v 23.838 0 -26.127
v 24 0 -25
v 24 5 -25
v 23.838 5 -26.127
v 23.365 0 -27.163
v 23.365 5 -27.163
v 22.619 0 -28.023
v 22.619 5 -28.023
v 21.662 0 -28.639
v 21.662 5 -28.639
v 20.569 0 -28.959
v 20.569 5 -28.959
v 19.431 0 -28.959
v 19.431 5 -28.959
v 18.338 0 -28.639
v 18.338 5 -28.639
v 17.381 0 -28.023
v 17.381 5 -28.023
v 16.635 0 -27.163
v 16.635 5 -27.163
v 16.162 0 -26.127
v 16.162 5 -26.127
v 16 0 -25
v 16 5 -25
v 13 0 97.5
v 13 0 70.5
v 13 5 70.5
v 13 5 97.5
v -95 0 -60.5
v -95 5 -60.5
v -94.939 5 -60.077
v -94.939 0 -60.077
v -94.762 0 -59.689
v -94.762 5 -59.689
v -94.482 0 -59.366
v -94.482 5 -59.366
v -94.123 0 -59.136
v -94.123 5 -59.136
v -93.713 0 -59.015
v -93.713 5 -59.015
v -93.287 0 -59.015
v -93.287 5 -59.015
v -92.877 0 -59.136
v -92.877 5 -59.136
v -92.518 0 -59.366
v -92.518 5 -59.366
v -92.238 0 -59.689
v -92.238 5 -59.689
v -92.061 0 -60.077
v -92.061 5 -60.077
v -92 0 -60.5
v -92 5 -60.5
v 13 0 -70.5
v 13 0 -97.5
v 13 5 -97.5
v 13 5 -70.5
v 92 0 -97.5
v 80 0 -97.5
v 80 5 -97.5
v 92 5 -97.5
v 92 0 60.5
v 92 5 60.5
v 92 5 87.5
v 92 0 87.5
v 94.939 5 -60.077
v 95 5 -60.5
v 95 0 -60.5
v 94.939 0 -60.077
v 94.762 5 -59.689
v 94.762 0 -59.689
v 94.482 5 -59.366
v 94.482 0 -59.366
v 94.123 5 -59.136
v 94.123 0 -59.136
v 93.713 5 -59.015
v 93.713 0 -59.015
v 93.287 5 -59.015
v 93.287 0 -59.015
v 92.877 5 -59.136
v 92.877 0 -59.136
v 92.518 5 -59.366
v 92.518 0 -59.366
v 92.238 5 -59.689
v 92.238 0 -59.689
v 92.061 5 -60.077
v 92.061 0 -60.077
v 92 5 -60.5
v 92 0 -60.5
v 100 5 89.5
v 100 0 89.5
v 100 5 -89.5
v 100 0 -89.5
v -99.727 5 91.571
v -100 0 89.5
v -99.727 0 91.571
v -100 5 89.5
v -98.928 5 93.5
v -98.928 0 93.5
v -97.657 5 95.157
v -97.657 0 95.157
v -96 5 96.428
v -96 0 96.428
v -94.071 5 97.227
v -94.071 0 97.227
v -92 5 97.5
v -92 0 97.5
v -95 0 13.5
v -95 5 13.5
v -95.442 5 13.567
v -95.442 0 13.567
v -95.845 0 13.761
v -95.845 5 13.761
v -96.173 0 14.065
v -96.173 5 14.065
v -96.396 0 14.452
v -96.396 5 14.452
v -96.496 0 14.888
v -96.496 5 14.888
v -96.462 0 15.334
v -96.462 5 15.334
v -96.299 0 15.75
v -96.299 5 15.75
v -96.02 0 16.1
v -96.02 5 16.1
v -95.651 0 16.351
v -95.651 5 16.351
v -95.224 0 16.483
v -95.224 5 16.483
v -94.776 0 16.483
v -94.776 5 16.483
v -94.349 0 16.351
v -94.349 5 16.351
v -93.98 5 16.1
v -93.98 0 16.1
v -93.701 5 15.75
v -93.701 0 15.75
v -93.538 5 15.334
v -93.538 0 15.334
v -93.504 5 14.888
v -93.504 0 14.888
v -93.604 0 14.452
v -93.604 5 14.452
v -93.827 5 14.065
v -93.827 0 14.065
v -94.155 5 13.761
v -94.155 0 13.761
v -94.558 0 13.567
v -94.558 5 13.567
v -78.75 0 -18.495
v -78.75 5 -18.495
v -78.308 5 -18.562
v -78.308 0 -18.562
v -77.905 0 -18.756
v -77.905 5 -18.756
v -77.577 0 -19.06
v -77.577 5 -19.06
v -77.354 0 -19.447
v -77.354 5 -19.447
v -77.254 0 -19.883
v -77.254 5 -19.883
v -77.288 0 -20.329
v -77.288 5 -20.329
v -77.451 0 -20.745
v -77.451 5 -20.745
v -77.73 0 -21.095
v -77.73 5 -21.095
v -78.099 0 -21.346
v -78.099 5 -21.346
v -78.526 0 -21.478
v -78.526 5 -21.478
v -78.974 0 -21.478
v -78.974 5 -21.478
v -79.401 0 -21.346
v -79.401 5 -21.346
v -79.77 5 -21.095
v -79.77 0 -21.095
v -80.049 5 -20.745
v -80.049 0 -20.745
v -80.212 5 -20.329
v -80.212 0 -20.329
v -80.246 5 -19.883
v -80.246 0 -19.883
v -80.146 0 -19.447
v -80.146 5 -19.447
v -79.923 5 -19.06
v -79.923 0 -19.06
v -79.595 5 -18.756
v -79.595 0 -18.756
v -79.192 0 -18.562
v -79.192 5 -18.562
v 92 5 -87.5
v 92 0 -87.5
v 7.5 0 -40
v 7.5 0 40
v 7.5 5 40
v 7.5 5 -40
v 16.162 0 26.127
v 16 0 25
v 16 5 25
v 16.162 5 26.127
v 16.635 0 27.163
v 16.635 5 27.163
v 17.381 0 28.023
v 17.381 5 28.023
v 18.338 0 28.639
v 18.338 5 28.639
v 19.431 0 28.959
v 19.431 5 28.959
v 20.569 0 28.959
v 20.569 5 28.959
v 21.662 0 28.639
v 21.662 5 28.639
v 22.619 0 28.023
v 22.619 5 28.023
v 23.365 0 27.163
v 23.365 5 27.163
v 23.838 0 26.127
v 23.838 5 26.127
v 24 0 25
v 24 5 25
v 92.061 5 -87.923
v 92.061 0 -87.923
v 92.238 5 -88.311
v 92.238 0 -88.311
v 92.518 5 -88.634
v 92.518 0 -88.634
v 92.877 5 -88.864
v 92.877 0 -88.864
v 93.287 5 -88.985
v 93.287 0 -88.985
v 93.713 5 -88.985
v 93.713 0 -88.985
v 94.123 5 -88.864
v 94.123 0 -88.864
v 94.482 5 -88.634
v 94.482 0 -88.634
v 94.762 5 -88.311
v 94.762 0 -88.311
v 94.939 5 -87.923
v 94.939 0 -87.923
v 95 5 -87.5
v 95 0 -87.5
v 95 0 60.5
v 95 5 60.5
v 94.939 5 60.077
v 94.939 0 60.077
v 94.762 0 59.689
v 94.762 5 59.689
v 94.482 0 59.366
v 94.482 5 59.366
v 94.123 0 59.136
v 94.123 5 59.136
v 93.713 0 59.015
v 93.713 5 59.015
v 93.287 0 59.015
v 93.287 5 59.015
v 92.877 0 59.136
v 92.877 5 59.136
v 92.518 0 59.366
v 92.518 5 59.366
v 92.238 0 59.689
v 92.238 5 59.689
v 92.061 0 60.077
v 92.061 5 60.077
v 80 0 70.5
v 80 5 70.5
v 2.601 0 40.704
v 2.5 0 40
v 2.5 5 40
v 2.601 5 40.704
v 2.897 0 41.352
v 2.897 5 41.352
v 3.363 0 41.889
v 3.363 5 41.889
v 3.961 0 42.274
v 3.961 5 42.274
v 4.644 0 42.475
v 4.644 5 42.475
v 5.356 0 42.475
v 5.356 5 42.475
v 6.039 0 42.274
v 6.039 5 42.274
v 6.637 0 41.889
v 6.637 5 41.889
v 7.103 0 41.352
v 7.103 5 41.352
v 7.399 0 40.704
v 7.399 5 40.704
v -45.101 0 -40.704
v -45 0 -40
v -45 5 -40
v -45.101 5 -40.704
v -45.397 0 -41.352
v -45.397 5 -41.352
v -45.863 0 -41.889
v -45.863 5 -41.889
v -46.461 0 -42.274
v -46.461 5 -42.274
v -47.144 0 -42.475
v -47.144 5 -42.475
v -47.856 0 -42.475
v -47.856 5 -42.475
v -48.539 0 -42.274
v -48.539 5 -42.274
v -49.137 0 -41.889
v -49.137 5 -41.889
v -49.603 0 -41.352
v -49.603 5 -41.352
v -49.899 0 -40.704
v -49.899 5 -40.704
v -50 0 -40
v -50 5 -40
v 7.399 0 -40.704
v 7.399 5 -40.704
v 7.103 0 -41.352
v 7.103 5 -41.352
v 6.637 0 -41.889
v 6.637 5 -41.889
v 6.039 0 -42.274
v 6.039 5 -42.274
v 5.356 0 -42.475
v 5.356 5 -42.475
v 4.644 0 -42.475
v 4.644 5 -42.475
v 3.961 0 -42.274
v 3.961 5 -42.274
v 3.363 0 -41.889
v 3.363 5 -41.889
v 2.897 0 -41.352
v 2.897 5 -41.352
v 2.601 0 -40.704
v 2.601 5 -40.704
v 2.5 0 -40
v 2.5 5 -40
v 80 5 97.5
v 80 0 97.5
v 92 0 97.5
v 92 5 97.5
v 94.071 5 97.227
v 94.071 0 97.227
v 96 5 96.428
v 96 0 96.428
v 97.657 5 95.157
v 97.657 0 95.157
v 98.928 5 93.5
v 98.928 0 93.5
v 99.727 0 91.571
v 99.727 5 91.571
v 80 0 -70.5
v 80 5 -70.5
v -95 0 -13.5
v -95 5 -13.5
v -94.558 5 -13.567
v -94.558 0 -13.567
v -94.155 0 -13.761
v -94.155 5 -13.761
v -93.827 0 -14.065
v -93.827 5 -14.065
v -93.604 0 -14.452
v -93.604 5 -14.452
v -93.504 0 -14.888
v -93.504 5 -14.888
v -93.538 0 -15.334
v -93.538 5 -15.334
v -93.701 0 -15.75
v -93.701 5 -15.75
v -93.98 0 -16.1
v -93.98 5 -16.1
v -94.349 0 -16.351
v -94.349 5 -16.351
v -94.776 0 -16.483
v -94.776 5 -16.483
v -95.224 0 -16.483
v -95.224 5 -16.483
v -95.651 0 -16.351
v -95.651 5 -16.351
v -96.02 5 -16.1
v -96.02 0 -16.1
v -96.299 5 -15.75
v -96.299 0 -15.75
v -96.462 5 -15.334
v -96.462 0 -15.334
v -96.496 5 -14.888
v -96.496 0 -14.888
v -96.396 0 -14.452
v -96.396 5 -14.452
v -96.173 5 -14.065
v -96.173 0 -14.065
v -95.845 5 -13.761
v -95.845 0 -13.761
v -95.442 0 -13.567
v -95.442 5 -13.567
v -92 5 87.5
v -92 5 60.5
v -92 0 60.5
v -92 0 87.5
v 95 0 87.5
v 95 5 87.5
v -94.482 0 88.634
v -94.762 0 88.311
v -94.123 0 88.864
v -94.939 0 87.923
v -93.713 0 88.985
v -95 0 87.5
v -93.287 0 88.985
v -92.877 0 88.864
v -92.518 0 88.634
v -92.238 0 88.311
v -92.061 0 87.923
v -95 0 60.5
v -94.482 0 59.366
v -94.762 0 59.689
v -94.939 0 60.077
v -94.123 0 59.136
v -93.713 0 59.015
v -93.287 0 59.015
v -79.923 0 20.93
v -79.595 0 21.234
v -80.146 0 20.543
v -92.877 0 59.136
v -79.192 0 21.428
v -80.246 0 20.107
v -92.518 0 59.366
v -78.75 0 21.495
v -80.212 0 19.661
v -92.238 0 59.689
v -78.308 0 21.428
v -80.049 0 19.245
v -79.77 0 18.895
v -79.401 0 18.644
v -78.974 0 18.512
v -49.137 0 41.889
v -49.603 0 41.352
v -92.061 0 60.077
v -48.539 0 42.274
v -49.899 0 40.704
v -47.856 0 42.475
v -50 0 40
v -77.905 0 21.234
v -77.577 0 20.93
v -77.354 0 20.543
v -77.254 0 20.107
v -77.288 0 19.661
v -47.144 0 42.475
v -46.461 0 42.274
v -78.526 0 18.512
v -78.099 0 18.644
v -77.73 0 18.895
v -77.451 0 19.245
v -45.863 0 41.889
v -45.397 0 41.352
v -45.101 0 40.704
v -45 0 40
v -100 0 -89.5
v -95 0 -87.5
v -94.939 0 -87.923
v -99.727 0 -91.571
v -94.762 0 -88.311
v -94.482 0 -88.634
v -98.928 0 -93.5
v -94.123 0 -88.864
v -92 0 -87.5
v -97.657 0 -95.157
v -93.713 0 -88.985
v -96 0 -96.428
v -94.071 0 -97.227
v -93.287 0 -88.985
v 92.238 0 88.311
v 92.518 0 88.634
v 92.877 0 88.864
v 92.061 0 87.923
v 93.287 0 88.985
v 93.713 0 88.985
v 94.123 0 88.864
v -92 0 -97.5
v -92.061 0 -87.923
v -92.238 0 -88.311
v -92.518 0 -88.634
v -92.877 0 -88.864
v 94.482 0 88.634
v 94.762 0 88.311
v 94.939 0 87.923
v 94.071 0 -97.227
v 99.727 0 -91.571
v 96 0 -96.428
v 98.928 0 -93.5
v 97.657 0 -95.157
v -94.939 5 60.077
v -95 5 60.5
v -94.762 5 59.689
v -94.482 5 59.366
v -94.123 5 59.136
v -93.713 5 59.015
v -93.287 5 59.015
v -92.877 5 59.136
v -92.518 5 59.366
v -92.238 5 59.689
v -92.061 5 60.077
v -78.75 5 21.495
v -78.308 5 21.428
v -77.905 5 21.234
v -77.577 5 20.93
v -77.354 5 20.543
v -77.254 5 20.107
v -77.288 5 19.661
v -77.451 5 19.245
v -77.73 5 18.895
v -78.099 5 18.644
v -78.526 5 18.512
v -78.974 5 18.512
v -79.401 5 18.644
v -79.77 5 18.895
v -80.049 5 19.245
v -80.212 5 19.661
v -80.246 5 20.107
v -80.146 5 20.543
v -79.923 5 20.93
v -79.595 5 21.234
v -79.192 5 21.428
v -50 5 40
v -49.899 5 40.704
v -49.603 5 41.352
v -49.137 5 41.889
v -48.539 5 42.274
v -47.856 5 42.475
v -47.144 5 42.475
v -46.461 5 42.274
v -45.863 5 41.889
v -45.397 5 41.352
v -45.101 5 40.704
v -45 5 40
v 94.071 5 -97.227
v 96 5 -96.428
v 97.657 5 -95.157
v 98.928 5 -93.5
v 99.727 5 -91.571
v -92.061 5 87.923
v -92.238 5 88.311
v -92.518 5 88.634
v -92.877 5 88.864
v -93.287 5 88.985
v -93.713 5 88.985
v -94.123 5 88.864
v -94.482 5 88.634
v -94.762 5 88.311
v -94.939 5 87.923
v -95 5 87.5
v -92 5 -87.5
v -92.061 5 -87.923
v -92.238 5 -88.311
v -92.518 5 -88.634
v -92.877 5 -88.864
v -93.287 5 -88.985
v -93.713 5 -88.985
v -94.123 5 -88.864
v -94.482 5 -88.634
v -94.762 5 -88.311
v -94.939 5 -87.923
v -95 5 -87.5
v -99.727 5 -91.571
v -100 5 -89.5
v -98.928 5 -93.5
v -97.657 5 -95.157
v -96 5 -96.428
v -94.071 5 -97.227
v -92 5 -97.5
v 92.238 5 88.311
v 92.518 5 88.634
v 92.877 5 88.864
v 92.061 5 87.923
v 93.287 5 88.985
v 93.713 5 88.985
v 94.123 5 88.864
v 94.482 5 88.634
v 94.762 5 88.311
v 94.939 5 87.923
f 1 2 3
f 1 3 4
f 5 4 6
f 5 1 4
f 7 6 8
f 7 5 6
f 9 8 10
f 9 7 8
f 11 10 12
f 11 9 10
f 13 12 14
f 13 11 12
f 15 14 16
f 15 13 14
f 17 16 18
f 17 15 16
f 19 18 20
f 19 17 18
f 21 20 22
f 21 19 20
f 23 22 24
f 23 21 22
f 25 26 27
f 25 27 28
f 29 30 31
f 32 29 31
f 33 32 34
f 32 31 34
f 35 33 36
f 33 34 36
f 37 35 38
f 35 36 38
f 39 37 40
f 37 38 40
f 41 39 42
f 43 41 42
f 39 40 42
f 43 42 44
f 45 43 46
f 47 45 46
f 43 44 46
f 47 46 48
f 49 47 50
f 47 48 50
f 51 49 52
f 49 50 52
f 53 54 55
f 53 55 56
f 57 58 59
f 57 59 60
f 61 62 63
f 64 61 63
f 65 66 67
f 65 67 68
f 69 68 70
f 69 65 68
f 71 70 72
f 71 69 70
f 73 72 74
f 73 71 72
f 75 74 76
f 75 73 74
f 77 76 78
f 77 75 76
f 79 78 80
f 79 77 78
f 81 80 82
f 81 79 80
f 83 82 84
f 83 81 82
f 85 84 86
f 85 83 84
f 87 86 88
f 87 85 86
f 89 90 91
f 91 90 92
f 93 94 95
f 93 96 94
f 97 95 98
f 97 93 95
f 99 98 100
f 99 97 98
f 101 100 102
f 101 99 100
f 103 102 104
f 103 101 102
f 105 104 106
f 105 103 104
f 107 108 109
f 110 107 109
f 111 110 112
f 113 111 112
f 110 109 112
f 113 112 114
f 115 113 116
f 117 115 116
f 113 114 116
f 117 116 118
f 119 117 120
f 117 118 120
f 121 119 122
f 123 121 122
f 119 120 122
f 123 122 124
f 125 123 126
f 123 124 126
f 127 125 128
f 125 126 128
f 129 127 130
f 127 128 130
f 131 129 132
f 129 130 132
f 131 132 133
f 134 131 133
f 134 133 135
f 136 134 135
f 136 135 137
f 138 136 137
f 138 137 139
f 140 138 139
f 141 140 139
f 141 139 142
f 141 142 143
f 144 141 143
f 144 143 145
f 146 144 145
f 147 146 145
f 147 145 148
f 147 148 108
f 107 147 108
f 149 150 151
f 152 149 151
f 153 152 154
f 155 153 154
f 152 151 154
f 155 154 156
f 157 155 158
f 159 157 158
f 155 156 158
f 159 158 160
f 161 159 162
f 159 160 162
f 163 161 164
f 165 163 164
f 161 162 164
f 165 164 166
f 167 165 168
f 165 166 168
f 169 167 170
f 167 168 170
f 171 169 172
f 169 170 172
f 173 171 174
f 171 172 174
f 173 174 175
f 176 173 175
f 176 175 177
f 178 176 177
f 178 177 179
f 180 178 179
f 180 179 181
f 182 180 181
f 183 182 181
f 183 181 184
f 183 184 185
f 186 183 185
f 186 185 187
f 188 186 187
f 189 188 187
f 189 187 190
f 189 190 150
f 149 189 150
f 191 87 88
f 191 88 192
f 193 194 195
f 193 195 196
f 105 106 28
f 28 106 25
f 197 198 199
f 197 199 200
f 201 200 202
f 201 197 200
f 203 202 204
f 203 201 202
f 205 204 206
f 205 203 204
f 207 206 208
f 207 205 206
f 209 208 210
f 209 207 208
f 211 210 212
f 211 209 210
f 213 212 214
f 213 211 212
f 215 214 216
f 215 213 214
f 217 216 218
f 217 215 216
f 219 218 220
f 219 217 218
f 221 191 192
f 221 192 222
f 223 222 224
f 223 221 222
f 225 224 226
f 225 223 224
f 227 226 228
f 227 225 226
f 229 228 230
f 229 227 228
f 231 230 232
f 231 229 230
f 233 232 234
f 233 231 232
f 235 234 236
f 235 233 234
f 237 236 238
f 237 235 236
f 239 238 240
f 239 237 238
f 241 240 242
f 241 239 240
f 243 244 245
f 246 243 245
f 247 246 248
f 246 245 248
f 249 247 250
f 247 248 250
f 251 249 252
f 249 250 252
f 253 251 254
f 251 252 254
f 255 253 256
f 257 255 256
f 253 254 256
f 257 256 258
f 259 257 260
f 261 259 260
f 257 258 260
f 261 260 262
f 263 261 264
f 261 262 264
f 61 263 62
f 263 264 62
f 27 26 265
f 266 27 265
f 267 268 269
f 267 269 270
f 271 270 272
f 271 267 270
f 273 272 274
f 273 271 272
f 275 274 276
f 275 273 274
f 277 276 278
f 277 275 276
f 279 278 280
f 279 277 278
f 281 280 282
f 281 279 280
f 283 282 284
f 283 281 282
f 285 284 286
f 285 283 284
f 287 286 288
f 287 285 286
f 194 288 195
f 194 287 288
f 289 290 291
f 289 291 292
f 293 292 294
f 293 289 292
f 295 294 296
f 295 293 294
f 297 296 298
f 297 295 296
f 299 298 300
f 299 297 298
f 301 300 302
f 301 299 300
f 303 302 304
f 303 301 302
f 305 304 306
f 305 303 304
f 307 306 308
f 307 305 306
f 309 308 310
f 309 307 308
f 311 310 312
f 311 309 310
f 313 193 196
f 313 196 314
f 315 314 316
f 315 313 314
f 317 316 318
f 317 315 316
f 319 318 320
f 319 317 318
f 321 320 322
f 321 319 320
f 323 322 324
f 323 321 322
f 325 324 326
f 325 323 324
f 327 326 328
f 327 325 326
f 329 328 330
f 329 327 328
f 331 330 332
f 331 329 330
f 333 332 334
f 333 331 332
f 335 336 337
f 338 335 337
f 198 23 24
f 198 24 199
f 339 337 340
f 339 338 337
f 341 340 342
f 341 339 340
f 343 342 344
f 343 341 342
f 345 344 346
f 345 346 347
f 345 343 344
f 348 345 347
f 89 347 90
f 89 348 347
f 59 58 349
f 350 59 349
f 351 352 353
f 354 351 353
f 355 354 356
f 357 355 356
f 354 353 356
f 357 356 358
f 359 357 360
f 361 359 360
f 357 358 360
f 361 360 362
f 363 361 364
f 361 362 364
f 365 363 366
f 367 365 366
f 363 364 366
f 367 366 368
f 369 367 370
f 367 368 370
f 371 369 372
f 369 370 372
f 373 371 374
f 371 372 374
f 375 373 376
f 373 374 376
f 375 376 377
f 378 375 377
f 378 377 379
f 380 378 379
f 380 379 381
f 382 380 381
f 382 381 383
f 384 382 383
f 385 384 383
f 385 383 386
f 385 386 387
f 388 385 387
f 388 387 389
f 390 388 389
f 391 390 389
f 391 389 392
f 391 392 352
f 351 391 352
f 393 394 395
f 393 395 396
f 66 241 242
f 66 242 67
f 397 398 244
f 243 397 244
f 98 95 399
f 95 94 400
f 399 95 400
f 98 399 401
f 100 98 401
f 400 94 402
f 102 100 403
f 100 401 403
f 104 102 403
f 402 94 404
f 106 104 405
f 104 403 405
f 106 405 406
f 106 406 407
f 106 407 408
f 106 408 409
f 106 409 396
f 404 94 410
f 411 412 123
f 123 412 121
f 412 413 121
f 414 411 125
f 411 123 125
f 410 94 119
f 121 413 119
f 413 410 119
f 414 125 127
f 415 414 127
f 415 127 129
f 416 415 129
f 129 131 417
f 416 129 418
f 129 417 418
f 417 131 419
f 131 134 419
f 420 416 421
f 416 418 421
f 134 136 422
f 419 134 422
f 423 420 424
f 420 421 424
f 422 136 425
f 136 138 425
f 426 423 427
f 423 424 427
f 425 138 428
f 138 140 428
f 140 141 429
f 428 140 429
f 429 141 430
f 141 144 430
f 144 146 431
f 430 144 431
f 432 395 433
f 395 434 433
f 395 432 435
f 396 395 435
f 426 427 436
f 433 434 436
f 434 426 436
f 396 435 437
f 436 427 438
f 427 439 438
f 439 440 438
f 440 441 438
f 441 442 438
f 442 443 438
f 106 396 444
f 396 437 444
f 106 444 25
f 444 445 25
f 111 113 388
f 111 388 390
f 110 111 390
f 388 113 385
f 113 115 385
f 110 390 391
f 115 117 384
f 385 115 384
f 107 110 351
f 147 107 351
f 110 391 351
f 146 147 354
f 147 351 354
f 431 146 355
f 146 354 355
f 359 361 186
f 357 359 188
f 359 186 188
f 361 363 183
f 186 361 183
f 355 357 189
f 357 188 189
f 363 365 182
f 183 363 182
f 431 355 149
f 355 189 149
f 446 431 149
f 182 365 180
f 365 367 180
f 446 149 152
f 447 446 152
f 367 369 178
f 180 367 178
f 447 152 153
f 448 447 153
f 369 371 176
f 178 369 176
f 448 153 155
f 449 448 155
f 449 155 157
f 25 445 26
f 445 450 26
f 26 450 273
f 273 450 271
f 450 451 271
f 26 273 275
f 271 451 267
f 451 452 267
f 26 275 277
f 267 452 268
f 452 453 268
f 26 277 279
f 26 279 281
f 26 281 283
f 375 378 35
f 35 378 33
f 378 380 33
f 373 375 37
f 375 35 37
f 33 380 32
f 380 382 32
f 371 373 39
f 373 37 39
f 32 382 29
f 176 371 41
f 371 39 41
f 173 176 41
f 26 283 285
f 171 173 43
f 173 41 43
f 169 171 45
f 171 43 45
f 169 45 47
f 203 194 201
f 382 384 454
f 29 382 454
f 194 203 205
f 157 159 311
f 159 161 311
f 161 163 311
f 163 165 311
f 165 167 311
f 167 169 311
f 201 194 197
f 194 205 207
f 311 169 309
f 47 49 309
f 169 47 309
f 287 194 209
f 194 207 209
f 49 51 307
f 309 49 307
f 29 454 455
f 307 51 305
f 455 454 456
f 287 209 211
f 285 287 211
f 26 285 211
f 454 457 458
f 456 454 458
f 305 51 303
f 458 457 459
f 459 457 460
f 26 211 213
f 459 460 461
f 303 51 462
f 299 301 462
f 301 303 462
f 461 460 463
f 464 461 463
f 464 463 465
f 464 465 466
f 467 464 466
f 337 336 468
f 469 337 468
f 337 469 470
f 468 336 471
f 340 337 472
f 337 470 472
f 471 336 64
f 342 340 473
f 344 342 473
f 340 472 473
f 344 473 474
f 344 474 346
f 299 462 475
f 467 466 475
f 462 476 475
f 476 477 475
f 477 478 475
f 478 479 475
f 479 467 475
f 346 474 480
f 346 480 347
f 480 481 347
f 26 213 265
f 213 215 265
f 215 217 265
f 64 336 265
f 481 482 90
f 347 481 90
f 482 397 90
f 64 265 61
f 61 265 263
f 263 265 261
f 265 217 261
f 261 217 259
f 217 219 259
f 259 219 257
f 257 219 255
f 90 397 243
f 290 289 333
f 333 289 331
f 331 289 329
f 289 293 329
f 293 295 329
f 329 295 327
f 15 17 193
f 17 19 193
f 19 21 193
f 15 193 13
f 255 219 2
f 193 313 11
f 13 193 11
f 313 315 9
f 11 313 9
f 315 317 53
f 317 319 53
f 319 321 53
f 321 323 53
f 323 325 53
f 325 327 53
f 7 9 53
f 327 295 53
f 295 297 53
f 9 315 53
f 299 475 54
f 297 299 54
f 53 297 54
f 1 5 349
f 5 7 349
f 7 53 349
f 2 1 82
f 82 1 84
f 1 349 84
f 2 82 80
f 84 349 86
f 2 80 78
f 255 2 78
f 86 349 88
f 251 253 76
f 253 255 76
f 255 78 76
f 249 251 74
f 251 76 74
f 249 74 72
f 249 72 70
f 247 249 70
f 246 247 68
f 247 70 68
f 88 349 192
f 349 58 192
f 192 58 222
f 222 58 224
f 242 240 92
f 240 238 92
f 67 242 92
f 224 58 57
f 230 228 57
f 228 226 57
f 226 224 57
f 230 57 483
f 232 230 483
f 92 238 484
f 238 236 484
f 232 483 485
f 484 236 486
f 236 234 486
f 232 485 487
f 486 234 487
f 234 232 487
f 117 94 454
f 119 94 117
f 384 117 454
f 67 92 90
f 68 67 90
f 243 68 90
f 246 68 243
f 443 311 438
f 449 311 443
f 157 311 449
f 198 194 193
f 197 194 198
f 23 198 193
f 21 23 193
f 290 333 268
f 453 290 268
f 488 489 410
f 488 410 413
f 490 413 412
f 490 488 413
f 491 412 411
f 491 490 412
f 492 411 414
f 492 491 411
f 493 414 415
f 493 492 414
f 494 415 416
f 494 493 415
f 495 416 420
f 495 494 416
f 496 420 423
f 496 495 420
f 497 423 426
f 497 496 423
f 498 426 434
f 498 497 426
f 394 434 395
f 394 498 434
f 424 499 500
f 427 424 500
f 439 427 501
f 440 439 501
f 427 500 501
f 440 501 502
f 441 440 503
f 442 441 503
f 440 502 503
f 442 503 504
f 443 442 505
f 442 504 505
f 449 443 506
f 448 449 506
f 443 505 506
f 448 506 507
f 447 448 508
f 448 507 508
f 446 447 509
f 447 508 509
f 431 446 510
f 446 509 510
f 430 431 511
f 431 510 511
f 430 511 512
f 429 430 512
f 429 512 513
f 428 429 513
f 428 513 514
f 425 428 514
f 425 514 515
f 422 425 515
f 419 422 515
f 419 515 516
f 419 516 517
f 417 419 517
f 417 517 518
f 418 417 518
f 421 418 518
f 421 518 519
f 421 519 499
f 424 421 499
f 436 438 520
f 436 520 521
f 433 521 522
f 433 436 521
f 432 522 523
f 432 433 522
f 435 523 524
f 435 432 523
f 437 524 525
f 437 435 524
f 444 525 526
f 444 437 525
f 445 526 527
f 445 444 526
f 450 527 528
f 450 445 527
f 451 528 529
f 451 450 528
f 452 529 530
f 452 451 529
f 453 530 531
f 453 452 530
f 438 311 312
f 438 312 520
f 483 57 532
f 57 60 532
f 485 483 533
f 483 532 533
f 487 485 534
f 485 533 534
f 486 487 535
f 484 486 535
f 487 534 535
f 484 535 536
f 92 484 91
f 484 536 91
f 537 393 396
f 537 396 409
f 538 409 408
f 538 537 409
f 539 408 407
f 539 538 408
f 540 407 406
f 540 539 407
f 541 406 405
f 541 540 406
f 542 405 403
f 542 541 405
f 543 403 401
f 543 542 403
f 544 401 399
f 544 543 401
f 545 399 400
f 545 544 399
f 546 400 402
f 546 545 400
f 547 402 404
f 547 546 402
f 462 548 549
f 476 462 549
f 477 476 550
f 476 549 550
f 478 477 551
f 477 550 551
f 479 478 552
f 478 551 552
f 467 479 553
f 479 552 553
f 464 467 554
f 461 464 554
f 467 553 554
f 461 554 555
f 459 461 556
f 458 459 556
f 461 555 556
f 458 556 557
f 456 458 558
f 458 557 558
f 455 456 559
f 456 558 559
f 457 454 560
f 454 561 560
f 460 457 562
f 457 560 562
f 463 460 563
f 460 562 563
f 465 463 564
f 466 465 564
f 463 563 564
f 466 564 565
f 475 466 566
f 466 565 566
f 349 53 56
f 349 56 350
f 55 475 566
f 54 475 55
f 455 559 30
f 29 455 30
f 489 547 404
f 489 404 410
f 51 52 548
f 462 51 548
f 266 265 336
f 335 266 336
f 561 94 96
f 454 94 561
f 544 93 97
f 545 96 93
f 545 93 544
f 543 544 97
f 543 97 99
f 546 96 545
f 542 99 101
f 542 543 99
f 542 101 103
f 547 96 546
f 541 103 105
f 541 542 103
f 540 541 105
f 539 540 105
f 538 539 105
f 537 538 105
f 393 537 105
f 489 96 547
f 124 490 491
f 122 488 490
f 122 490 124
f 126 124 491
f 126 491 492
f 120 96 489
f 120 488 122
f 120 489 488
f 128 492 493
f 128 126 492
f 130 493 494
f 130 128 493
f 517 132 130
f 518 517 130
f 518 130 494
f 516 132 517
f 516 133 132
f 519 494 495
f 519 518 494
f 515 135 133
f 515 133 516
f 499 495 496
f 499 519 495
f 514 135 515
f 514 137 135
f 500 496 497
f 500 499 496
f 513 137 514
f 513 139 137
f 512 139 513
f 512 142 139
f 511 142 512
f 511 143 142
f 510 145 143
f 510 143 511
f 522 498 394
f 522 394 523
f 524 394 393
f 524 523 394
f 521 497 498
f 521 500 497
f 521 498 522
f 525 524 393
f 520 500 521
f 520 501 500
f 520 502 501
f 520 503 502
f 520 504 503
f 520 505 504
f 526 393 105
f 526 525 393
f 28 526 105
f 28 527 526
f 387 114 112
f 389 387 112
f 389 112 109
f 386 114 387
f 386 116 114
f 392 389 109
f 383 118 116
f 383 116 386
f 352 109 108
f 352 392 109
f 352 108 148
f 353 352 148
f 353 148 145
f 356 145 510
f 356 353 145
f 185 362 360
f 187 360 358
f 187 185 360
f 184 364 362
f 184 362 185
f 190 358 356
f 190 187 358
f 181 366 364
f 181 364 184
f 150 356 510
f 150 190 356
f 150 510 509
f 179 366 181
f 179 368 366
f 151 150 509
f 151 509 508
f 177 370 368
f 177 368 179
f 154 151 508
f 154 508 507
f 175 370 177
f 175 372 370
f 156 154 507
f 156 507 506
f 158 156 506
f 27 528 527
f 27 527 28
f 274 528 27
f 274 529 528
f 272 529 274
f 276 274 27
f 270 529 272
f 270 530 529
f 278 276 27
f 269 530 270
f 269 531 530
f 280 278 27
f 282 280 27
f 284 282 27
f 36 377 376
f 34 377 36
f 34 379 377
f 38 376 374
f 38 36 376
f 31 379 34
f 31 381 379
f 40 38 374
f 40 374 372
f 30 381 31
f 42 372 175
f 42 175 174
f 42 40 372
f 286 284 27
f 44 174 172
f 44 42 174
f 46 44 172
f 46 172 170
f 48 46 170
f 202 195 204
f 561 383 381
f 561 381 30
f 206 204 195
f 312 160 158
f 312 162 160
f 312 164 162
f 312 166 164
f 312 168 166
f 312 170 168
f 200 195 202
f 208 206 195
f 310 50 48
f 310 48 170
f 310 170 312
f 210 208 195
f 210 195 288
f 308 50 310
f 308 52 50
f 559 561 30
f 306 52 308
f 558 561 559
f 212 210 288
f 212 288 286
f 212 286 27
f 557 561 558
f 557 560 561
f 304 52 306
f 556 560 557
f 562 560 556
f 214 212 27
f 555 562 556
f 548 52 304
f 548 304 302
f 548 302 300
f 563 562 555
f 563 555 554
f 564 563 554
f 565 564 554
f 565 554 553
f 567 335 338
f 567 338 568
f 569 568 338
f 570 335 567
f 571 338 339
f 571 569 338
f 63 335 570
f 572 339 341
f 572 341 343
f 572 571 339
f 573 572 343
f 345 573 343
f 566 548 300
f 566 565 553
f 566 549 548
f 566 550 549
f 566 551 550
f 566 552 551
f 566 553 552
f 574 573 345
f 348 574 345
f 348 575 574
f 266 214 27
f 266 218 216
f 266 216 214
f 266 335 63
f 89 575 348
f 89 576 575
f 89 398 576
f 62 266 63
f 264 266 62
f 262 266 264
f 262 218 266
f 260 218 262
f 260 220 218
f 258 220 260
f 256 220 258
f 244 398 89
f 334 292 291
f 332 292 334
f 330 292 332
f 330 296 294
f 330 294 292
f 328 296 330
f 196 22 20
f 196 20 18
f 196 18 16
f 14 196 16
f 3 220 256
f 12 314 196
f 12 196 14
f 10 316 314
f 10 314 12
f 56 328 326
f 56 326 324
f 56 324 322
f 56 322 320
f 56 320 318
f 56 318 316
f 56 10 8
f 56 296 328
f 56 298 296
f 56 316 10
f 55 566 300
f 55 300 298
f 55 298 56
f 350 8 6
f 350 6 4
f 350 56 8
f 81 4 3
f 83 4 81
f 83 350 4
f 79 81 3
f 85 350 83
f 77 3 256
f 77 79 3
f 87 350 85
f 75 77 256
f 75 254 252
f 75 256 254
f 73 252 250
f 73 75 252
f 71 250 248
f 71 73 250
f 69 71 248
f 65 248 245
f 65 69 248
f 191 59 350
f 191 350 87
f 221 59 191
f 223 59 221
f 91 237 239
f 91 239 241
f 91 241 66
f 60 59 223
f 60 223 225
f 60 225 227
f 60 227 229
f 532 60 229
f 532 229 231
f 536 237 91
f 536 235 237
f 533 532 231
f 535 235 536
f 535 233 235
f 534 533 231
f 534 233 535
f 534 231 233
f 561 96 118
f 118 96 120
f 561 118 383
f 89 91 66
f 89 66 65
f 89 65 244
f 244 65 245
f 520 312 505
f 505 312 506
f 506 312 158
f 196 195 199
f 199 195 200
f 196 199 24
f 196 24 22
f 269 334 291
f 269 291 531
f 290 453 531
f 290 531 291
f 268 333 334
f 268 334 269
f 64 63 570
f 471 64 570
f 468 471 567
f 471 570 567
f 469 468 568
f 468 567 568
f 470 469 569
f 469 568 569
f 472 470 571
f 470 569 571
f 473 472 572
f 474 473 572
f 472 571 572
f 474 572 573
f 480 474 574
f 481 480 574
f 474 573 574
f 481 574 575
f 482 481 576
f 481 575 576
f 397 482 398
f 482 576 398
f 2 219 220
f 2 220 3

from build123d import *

# Parameters (mm, degrees)
SKETCH2_W           = 200
SKETCH2_H           = 195
BOSS_EXTRUDE1_DEPTH = 5
CUT_EXTRUDE1_DEPTH  = 140.754248594
SKETCH4_W           = 67
SKETCH4_H           = 27
CUT_EXTRUDE2_DEPTH  = 140.754248594
SKETCH8_R           = 1.5
CUT_EXTRUDE6_DEPTH  = 140.754248594
SKETCH9_R           = 1.5
CUT_EXTRUDE7_DEPTH  = 140.754248594
FILLET1_R           = 8


with BuildPart() as part:
    # Sketch2 → Boss-Extrude1 (new body)
    with BuildSketch(Plane(origin=(0, 0, 0), x_dir=(1, 0, 0), z_dir=(0, 1, 0))):
        Rectangle(SKETCH2_W, SKETCH2_H)
    extrude(amount=BOSS_EXTRUDE1_DEPTH)

    # Sketch3 → Cut-Extrude1 (cut, through all)
    with BuildSketch(Plane(origin=(0, 5, 0), x_dir=(1, 0, 0), z_dir=(0, 1, 0))):
        with BuildLine():
            Line((-95, -87.5), (-95, -60.5))
            ThreePointArc((-95, -60.5), (-93.5, -59), (-92, -60.5))
            Line((-92, -60.5), (-92, -87.5))
            ThreePointArc((-92, -87.5), (-93.5, -89), (-95, -87.5))
        make_face()
        with BuildLine():
            Line((-95, 87.5), (-95, 60.5))
            ThreePointArc((-95, 60.5), (-93.5, 59), (-92, 60.5))
            Line((-92, 60.5), (-92, 87.5))
            ThreePointArc((-92, 87.5), (-93.5, 89), (-95, 87.5))
        make_face()
        with BuildLine():
            Line((95, 87.5), (95, 60.5))
            ThreePointArc((95, 60.5), (93.5, 59), (92, 60.5))
            Line((92, 60.5), (92, 87.5))
            ThreePointArc((92, 87.5), (93.5, 89), (95, 87.5))
        make_face()
        with BuildLine():
            Line((95, -87.5), (95, -60.5))
            ThreePointArc((95, -60.5), (93.5, -59), (92, -60.5))
            Line((92, -60.5), (92, -87.5))
            ThreePointArc((92, -87.5), (93.5, -89), (95, -87.5))
        make_face()
    extrude(amount=-CUT_EXTRUDE1_DEPTH, mode=Mode.SUBTRACT)

    # Sketch4 → Cut-Extrude2 (cut, through all)
    with BuildSketch(Plane.XZ):
        with Locations((46.5, -84)):
            Rectangle(SKETCH4_W, SKETCH4_H)
        with Locations((46.5, 84)):
            Rectangle(SKETCH4_W, SKETCH4_H)
        with BuildLine():
            Line((-45, 40), (-45, -40))
            ThreePointArc((-45, -40), (-47.5, -42.5), (-50, -40))
            Line((-50, -40), (-50, 40))
            ThreePointArc((-50, 40), (-47.5, 42.5), (-45, 40))
        make_face()
        with BuildLine():
            Line((24, 25), (24, -25))
            ThreePointArc((24, -25), (20, -29), (16, -25))
            Line((16, -25), (16, 25))
            ThreePointArc((16, 25), (20, 29), (24, 25))
        make_face()
        with BuildLine():
            Line((7.5, 40), (7.5, -40))
            ThreePointArc((7.5, -40), (5, -42.5), (2.5, -40))
            Line((2.5, -40), (2.5, 40))
            ThreePointArc((2.5, 40), (5, 42.5), (7.5, 40))
        make_face()
    extrude(amount=-CUT_EXTRUDE2_DEPTH, mode=Mode.SUBTRACT)

    # Sketch8 → Cut-Extrude6 (cut, through all)
    with BuildSketch(Plane(origin=(0, 5, 0), x_dir=(1, 0, 0), z_dir=(0, 1, 0))):
        with Locations(Location((-78.75, 19.995, 0), (0, 0, 270))):
            Circle(SKETCH8_R)
        with Locations(Location((-78.75, -19.995, 0), (0, 0, 270))):
            Circle(SKETCH8_R)
    extrude(amount=-CUT_EXTRUDE6_DEPTH, mode=Mode.SUBTRACT)

    # Sketch9 → Cut-Extrude7 (cut, through all)
    with BuildSketch(Plane(origin=(0, 5, 0), x_dir=(1, 0, 0), z_dir=(0, 1, 0))):
        with Locations(Location((-95, 15, 0), (0, 0, 270))):
            Circle(SKETCH9_R)
        with Locations(Location((-95, -15, 0), (0, 0, 90))):
            Circle(SKETCH9_R)
    extrude(amount=-CUT_EXTRUDE7_DEPTH, mode=Mode.SUBTRACT)

    # Fillet1
    fillet1_edges = [part.edges().sort_by_distance(p)[0] for p in [
        (100, 2.5, 97.5),
        (-100, 2.5, 97.5),
        (-100, 2.5, -97.5),
        (100, 2.5, -97.5),
    ]]
    fillet(fillet1_edges, radius=FILLET1_R)


solid = part.part
